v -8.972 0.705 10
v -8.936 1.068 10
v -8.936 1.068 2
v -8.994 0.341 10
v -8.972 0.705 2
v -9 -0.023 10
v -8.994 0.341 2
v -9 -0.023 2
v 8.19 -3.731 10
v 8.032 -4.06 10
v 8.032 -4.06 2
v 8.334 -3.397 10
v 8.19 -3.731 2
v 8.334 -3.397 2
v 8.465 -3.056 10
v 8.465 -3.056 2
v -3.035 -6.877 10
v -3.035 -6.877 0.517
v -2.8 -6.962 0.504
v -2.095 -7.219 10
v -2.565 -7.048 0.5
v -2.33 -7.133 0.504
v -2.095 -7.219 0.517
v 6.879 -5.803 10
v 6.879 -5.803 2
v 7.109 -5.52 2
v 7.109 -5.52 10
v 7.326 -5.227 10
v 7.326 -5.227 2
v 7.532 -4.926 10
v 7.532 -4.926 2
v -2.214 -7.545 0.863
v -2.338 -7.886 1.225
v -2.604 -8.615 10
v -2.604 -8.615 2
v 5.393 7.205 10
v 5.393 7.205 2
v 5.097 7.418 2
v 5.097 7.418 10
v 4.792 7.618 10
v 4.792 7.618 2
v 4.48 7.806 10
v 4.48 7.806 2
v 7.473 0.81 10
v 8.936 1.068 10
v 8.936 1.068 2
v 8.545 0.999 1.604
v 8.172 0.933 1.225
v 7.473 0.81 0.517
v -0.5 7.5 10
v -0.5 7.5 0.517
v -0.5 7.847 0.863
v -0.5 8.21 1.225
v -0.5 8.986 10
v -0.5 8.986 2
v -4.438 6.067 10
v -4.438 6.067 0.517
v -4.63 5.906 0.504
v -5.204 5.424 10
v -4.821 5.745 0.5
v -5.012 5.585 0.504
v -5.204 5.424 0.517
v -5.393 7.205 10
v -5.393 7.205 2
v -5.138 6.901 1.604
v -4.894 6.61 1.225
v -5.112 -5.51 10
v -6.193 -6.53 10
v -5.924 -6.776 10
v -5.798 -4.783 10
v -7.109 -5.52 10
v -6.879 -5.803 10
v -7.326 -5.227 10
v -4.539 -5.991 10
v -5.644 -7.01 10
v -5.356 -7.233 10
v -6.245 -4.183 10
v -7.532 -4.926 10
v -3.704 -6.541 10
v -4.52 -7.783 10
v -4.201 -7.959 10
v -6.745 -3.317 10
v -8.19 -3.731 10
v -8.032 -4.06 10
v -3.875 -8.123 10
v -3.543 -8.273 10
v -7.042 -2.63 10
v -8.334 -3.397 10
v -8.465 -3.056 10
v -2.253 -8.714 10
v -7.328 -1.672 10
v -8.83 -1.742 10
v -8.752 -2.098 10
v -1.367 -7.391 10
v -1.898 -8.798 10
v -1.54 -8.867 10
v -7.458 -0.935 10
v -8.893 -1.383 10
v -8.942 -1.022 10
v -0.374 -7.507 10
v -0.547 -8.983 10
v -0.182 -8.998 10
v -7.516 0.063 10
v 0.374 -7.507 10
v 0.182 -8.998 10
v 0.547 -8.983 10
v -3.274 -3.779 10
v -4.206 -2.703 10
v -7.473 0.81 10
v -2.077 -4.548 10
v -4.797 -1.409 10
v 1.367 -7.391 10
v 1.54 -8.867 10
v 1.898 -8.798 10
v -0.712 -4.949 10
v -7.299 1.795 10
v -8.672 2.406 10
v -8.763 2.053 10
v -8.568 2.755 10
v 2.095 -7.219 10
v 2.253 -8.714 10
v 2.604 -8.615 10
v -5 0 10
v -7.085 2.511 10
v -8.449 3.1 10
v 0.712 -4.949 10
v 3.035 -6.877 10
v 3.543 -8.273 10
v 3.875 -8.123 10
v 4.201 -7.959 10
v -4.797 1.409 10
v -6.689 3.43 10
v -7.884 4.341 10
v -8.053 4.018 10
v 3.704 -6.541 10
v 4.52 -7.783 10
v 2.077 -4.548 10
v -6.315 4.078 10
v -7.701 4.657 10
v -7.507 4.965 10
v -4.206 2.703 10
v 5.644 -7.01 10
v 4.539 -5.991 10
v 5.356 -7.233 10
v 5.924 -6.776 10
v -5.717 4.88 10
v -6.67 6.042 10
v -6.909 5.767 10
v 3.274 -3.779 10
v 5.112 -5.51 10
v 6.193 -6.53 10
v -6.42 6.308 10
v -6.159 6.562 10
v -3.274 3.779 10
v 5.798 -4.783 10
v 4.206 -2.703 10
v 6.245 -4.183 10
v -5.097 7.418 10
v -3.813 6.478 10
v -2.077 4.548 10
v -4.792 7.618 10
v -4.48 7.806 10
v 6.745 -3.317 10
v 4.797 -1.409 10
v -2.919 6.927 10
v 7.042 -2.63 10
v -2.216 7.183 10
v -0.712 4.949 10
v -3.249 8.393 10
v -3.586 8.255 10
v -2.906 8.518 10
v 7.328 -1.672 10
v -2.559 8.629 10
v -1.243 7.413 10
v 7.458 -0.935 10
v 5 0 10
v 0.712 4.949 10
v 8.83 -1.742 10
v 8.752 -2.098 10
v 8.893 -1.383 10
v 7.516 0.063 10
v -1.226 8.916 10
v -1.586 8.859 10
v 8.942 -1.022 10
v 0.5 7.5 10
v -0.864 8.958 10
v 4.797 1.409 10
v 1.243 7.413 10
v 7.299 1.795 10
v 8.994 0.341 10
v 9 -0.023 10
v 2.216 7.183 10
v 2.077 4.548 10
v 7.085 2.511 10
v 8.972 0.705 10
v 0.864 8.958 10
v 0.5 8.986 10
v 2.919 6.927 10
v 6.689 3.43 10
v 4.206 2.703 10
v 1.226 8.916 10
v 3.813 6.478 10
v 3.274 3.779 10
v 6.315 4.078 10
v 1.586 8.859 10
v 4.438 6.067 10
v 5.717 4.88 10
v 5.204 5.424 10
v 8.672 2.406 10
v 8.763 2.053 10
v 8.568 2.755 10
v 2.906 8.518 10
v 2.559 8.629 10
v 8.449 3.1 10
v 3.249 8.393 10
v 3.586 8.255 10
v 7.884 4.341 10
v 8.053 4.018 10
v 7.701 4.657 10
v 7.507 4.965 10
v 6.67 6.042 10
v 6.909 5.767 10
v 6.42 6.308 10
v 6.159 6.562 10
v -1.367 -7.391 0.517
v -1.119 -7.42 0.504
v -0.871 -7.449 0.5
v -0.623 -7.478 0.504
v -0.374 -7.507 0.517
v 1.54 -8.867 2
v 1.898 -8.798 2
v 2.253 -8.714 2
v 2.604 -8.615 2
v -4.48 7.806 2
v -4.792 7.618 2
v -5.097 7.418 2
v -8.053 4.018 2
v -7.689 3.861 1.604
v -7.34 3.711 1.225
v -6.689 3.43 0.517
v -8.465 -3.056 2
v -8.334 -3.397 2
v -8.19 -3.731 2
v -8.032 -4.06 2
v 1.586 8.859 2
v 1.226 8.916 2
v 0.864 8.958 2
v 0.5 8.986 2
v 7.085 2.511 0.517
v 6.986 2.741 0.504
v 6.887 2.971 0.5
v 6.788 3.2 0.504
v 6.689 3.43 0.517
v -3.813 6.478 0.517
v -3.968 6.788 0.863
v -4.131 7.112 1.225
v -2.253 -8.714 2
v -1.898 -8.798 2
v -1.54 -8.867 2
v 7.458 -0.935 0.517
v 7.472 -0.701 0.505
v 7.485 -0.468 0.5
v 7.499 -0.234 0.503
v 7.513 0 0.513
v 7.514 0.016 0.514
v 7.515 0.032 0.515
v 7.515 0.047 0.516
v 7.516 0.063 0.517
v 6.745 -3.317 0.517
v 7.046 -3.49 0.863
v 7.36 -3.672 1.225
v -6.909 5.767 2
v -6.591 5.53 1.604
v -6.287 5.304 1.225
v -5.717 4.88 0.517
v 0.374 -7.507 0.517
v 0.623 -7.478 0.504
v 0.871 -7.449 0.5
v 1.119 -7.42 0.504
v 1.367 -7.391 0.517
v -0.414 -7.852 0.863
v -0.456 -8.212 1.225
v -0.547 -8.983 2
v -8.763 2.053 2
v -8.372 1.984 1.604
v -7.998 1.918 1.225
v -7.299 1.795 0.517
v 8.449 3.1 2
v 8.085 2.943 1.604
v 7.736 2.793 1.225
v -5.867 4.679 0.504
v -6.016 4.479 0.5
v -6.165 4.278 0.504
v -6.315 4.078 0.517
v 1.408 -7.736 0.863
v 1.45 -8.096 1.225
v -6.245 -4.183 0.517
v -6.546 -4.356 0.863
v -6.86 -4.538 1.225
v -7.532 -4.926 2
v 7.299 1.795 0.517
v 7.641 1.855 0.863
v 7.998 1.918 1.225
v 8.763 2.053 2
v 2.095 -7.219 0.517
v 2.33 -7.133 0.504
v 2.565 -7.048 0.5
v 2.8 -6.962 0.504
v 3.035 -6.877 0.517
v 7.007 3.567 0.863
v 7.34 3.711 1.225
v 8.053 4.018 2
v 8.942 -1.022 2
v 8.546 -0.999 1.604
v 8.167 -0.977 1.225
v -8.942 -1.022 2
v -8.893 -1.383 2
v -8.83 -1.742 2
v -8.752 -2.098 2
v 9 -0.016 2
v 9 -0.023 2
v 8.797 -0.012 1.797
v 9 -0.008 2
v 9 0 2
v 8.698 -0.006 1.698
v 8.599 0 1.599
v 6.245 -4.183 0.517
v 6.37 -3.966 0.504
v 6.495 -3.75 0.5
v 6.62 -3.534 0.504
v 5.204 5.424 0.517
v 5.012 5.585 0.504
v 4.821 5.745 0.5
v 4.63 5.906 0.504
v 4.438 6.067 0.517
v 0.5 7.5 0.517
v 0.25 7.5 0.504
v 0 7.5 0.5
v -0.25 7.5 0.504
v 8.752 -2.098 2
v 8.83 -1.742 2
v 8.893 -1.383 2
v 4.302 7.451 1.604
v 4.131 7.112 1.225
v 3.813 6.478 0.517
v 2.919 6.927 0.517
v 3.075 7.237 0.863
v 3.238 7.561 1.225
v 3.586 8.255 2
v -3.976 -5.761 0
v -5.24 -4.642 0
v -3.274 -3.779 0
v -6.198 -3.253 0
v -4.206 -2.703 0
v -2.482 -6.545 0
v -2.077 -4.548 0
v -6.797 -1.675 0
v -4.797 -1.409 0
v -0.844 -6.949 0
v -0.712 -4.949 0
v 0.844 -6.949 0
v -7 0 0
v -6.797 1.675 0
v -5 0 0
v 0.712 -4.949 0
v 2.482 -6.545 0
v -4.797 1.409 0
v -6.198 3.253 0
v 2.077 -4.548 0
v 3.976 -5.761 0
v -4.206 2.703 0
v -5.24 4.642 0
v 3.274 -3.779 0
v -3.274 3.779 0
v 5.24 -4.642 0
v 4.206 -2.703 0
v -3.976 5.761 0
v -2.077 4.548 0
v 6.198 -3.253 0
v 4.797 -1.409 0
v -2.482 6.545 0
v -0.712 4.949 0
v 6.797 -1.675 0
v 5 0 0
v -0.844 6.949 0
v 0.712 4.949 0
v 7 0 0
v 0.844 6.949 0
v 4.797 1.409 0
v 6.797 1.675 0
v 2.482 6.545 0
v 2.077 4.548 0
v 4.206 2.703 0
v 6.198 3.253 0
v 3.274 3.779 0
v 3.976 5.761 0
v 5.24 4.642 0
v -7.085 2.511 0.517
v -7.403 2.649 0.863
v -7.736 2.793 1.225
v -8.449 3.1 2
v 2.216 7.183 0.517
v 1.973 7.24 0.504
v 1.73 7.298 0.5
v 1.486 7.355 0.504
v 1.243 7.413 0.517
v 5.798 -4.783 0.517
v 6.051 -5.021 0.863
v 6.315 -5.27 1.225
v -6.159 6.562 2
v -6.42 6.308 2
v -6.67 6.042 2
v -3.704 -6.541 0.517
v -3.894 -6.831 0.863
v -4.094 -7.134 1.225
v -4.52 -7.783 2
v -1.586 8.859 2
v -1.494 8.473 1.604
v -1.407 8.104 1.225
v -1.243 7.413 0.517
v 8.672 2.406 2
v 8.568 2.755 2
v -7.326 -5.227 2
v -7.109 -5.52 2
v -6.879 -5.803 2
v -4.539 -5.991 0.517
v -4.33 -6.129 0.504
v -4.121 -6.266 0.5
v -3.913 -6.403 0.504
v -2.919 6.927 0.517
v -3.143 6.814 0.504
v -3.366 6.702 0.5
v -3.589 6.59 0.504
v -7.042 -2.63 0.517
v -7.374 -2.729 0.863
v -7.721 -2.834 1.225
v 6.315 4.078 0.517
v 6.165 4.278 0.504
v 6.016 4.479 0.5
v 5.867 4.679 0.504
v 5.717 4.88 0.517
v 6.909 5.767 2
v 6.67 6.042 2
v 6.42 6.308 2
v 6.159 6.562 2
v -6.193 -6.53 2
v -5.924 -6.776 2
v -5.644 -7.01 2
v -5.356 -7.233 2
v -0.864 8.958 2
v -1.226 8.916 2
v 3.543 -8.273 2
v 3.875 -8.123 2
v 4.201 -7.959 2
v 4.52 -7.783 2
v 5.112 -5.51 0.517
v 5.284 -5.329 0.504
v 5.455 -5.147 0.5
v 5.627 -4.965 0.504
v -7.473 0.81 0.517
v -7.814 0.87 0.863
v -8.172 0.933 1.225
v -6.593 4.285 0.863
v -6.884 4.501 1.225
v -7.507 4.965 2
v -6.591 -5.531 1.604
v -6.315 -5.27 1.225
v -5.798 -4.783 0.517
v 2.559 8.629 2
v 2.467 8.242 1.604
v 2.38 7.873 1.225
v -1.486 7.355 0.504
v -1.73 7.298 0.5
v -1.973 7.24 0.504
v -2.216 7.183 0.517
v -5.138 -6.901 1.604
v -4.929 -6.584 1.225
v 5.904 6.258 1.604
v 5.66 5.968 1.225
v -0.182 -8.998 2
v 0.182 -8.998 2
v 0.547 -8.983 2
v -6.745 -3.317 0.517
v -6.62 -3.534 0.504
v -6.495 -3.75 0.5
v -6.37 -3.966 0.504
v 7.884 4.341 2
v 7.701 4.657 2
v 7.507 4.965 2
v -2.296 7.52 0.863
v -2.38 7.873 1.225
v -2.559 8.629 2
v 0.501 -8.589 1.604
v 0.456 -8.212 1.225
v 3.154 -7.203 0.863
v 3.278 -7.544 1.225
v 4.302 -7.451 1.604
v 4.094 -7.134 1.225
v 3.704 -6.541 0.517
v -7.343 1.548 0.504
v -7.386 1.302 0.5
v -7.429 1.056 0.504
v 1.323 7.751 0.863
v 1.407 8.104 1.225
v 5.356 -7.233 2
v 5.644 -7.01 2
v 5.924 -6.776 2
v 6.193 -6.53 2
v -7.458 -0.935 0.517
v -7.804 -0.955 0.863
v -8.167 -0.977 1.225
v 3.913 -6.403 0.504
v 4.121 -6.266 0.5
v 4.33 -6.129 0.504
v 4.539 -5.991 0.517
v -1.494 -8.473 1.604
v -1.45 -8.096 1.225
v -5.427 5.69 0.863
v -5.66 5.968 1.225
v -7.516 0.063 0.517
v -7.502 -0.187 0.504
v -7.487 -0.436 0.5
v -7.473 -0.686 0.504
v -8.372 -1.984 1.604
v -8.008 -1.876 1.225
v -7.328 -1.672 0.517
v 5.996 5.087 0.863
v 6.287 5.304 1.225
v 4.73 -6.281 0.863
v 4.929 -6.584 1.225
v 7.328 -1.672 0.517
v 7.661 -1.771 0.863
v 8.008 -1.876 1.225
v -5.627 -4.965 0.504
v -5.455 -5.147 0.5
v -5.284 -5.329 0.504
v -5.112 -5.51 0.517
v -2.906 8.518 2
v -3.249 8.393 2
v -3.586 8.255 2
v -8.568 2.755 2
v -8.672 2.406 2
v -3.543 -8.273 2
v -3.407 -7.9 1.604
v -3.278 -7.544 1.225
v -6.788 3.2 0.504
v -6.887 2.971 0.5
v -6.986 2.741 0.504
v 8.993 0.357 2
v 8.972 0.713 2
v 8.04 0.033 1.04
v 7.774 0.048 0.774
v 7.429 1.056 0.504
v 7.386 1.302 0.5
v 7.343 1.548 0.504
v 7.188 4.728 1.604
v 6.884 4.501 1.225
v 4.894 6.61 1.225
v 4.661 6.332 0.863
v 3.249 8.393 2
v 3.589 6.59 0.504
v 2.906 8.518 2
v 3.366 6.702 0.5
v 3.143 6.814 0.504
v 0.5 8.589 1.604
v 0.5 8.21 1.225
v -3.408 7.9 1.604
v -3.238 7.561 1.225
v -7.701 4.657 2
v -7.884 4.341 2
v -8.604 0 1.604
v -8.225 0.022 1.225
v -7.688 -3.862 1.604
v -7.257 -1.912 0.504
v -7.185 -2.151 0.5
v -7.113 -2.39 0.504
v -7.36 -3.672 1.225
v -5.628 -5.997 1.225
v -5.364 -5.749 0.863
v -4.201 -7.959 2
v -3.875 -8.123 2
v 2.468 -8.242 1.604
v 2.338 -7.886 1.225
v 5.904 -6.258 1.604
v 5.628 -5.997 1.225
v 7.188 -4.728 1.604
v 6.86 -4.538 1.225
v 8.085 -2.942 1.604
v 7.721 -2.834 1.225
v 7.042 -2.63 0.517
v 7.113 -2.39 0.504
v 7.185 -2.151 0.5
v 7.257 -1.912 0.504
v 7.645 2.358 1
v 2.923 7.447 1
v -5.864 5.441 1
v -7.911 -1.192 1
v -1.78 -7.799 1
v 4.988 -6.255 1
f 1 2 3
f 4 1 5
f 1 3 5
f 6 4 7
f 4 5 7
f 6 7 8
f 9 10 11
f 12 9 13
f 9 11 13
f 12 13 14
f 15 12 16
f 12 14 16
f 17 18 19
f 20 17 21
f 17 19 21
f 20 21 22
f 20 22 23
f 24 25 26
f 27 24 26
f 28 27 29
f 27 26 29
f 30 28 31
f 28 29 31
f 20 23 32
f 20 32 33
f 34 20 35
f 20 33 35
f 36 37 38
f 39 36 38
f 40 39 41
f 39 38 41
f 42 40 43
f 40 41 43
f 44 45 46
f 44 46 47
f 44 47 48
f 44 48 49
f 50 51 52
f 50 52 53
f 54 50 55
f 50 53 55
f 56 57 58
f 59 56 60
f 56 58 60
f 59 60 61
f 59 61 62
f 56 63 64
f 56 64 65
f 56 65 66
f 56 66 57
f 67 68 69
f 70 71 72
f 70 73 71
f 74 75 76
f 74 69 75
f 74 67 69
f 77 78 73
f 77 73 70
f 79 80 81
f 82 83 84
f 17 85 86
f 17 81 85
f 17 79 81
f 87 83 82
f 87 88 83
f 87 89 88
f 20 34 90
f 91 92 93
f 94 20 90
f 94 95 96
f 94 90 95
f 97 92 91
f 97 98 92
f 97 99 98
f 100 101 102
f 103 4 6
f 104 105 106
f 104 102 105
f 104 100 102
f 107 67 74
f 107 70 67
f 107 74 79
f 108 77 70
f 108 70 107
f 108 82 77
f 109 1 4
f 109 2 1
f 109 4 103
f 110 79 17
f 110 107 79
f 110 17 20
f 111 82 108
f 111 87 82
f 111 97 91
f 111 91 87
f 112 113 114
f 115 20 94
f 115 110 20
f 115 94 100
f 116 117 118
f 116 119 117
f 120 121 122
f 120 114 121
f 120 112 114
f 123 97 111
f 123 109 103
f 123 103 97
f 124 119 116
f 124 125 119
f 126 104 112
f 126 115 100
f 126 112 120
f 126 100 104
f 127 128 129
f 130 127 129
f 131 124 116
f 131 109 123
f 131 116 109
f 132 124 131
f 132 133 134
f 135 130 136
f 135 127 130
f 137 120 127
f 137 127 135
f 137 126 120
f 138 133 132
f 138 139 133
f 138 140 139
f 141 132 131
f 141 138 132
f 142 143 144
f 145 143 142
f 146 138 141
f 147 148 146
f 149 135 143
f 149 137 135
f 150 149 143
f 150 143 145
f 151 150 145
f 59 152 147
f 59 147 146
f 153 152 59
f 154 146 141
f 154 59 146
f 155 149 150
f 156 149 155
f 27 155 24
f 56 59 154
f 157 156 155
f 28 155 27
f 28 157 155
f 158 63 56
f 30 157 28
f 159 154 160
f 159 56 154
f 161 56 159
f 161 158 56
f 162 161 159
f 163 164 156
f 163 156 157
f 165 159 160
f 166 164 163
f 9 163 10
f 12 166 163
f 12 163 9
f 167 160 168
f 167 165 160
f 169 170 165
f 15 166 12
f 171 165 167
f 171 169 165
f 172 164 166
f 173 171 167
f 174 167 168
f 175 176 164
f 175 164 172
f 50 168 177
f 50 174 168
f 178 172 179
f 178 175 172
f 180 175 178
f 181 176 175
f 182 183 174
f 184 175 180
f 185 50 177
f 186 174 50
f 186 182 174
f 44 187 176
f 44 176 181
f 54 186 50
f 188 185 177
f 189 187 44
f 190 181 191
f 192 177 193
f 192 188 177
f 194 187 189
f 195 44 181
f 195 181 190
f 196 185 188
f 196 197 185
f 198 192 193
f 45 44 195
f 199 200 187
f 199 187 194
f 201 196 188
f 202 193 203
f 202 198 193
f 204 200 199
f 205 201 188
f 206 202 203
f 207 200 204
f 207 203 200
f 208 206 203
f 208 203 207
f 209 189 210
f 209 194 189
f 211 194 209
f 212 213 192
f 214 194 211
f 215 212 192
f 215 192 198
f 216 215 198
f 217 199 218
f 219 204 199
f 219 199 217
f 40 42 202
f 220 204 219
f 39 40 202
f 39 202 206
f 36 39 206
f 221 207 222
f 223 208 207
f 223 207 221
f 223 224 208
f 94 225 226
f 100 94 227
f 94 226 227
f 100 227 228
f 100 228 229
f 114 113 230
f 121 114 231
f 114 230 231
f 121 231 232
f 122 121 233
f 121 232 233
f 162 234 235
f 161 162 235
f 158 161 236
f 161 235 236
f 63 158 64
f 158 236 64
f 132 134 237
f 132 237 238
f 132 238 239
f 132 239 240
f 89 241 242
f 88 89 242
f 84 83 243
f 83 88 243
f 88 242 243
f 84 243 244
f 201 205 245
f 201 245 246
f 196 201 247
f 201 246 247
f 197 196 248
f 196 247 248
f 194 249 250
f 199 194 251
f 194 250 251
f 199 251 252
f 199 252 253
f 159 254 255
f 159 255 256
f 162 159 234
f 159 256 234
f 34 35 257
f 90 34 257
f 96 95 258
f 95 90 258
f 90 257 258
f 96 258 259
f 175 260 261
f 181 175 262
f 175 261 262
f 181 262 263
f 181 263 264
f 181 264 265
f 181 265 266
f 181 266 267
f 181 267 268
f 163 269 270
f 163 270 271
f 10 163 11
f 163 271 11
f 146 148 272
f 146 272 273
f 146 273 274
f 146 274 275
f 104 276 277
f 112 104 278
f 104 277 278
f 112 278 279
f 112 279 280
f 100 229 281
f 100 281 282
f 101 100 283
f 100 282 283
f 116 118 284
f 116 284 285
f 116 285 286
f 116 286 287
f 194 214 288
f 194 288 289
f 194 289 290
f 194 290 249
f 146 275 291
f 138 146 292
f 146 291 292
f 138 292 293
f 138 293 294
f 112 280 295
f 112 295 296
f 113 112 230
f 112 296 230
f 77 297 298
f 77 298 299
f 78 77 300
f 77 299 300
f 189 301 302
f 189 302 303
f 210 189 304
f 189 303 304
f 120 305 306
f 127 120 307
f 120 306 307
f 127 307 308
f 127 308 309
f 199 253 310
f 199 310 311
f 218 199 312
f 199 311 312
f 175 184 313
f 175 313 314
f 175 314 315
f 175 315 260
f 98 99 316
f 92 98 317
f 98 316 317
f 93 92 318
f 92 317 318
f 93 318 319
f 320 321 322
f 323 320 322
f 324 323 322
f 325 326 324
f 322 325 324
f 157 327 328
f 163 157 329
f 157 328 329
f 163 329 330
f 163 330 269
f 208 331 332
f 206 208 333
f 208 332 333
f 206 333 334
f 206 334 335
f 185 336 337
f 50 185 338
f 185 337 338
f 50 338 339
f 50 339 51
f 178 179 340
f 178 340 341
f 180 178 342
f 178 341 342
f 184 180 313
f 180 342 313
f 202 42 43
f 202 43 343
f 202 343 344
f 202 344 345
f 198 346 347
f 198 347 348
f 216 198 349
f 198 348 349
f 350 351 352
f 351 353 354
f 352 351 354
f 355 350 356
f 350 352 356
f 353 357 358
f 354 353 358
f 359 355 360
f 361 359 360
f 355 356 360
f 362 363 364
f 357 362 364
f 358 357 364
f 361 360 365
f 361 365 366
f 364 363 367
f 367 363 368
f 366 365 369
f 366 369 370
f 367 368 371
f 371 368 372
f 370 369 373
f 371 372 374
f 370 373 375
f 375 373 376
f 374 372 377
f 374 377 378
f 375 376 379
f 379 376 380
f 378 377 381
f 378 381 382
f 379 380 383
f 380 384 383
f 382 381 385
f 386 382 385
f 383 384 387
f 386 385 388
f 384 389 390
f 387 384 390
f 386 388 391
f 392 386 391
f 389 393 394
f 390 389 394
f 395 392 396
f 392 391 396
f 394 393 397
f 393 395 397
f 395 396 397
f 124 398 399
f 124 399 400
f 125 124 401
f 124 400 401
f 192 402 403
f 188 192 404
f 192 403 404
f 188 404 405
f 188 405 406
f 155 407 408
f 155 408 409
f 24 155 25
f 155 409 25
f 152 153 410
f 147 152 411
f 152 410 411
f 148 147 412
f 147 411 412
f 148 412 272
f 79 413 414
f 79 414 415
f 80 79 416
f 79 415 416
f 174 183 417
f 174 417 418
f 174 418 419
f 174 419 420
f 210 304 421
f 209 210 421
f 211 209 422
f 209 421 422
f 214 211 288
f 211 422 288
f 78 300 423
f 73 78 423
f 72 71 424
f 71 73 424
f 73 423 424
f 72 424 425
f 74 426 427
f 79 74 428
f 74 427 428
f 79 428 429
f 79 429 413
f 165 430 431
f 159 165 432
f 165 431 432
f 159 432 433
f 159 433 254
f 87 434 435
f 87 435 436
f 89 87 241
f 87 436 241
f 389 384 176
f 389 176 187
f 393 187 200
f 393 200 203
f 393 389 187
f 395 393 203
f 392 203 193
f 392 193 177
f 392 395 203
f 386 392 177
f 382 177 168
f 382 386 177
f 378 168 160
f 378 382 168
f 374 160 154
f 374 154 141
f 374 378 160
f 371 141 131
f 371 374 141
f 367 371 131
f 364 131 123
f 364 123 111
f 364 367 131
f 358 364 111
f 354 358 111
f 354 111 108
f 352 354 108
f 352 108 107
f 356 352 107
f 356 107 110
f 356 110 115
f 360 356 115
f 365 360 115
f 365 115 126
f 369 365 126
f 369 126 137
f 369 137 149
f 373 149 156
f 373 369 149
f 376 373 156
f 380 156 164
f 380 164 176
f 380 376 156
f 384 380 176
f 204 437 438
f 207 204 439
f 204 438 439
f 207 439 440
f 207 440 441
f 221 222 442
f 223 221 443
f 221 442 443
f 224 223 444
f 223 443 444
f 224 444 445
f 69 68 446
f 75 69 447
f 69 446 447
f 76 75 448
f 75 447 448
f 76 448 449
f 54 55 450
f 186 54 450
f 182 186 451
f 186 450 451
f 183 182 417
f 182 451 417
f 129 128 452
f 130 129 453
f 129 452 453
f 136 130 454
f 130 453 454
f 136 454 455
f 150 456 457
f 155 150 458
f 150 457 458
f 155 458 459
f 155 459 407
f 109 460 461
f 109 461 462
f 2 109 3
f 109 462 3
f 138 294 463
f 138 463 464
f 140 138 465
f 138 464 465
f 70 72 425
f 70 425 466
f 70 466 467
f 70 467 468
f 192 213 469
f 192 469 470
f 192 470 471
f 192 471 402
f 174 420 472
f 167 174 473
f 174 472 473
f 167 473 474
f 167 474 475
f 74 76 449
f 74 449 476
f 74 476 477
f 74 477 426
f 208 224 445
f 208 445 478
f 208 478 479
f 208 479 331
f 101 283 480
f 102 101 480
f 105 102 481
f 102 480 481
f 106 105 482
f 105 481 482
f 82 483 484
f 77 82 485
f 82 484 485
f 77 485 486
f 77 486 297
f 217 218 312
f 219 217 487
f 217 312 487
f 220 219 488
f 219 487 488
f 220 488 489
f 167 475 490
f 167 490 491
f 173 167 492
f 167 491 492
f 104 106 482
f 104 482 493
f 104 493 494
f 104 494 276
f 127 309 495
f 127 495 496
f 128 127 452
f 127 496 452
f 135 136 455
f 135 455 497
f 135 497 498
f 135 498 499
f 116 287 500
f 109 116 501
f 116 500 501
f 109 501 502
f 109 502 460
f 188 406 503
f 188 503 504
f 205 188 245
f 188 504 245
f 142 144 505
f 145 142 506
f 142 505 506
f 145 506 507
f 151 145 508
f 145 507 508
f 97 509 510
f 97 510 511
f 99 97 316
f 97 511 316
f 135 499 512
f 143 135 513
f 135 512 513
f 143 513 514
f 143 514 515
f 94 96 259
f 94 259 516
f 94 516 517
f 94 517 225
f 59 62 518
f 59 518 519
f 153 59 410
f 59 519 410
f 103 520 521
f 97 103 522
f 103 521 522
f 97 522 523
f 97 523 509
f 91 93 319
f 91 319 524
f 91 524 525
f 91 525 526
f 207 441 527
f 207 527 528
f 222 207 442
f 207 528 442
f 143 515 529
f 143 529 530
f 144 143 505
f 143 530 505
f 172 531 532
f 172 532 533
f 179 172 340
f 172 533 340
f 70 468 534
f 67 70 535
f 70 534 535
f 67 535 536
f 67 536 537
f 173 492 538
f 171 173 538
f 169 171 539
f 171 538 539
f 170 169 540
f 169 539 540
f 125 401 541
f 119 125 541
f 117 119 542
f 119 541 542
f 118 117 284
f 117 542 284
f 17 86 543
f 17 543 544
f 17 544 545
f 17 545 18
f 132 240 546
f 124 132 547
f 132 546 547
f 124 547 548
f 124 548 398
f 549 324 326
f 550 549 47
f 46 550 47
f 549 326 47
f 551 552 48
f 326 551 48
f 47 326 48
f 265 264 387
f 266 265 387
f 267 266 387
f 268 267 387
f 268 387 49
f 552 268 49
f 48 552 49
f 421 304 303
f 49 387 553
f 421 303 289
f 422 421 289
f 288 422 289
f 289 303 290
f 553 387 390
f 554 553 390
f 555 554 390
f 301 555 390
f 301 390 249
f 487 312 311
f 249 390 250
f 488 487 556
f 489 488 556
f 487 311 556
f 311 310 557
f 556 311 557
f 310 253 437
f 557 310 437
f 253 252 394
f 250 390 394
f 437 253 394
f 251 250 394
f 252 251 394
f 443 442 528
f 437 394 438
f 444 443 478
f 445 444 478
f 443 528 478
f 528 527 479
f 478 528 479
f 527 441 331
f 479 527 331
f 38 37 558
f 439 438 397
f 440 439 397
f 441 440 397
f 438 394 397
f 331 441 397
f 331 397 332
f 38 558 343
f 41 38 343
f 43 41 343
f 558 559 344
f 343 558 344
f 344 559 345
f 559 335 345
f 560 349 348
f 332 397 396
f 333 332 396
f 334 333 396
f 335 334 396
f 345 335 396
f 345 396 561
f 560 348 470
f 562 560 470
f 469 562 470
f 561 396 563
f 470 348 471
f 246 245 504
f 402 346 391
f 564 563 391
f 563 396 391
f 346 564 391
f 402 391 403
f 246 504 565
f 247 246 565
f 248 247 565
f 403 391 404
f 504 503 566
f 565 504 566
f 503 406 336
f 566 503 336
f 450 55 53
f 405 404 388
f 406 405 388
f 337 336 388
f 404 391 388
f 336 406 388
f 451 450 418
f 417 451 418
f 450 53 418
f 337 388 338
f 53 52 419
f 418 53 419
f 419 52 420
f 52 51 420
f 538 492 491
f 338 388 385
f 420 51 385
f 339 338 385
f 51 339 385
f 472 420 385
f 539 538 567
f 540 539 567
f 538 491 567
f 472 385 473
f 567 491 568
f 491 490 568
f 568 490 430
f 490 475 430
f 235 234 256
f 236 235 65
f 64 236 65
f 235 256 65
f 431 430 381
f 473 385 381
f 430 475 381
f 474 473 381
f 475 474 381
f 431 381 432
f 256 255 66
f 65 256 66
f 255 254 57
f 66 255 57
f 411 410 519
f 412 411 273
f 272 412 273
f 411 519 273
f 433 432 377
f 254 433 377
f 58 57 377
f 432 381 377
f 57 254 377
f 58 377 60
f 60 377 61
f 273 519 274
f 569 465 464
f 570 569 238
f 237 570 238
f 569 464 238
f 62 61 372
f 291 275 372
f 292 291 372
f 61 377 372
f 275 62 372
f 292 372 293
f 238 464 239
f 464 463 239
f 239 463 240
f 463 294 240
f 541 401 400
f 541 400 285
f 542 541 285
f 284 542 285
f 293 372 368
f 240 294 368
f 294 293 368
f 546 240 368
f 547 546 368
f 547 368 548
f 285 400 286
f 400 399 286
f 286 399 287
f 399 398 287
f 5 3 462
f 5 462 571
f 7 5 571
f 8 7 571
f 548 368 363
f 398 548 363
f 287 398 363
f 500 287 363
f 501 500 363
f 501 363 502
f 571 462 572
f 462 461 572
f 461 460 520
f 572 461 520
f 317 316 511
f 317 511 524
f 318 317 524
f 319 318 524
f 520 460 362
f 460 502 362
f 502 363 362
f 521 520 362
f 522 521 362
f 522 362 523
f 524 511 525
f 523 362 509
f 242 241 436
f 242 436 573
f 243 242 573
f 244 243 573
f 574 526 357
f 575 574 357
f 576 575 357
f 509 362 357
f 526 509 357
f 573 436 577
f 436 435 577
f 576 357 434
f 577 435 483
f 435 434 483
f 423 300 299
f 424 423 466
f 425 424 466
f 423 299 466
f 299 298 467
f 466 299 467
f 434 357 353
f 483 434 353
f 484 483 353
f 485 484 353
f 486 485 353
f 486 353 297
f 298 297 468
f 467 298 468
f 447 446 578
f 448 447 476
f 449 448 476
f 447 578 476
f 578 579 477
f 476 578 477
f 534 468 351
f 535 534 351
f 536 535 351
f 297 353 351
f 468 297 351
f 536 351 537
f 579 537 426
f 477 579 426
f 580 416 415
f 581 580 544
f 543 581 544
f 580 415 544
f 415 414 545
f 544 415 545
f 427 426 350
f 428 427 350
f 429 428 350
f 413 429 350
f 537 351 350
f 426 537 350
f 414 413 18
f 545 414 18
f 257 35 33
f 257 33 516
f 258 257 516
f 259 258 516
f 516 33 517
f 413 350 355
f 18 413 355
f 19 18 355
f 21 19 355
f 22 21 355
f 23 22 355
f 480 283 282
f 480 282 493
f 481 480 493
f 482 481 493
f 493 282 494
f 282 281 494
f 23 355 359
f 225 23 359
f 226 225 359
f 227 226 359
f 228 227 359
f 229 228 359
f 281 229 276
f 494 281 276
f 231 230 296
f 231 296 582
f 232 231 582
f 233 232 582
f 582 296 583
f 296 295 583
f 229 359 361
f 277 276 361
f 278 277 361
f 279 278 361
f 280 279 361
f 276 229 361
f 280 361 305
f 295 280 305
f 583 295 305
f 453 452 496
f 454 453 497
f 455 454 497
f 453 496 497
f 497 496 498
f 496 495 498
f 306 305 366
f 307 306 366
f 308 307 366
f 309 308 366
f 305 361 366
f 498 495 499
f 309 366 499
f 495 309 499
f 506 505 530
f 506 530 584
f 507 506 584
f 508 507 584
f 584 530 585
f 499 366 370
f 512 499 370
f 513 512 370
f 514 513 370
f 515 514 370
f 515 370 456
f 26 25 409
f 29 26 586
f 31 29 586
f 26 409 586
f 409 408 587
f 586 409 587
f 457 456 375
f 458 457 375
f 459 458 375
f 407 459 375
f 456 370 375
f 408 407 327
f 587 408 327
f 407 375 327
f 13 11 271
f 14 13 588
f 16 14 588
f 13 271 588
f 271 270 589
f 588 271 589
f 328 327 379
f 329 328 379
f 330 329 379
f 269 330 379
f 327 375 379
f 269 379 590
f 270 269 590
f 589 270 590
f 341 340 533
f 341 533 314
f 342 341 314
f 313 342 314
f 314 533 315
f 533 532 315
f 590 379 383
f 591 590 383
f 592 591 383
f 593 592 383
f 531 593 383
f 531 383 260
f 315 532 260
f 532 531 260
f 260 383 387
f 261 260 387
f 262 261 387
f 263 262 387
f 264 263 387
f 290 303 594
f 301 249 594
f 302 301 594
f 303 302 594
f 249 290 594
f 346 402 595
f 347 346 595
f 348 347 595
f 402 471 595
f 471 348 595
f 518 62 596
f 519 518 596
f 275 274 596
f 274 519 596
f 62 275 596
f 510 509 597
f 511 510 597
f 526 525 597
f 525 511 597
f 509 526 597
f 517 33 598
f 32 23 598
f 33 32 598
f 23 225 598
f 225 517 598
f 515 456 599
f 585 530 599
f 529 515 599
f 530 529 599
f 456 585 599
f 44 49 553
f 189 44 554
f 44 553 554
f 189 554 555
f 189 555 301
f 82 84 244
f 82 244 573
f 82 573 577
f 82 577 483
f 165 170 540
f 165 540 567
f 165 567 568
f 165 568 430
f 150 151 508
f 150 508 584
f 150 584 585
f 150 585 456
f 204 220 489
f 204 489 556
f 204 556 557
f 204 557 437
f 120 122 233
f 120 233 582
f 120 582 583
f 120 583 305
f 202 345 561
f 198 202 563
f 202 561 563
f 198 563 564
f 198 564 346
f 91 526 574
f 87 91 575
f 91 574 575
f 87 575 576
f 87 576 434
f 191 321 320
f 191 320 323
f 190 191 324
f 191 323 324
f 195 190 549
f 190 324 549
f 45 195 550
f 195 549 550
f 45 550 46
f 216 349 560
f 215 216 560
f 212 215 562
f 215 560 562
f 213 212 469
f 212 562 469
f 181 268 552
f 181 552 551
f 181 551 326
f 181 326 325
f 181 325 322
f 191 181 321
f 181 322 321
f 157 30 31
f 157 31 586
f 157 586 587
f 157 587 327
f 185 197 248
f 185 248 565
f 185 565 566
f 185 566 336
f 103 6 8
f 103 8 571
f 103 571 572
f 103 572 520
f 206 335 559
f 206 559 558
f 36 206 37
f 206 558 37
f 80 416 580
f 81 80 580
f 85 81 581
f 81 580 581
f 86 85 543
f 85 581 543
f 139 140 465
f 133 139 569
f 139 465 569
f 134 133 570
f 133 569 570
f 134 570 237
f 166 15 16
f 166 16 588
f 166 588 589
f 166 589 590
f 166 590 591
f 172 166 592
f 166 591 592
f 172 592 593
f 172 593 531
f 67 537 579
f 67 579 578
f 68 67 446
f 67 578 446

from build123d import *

# Parameters (mm, degrees)
SKETCH1_R           = 9
SKETCH1_R_2         = 5
BOSS_EXTRUDE1_DEPTH = 10
CHAMFER1_SIZE       = 2
CUT_EXTRUDE1_DEPTH  = 17.186414056
CIRPATTERN1_COUNT   = 27


with BuildPart() as part:
    # Sketch1 → Boss-Extrude1 (new body)
    with BuildSketch(Plane.XY):
        Circle(SKETCH1_R)
        Circle(SKETCH1_R_2, mode=Mode.SUBTRACT)
    extrude(amount=BOSS_EXTRUDE1_DEPTH)

    # Chamfer1
    chamfer1_edges = [part.edges().sort_by_distance(p)[0] for p in [
        (-9, 0, 0),
    ]]
    chamfer(chamfer1_edges, length=CHAMFER1_SIZE)

    # Sketch2 → Cut-Extrude1 (cut, through all)
    with BuildSketch(Plane(origin=(0, 0, 0), x_dir=(-1, 0, 0), z_dir=(0, 0, -1))):
        with BuildLine():
            Line((-0.5, 7.5), (0.5, 7.5))
            Line((0.5, 7.5), (0.5, 8.986100378))
            ThreePointArc((0.5, 8.986100378), (0, 9), (-0.5, 8.986100378))
            Line((-0.5, 8.986100378), (-0.5, 7.5))
        make_face()
    cut_extrude1 = extrude(amount=-CUT_EXTRUDE1_DEPTH, mode=Mode.SUBTRACT)

    # CirPattern1: Cut-Extrude1 ×27 about axis
    cirpattern1_axis = Axis((0, 0, 10), (0, 0, -1))
    for i in range(1, CIRPATTERN1_COUNT):
        add(cut_extrude1.rotate(cirpattern1_axis, i * 360 / CIRPATTERN1_COUNT), mode=Mode.SUBTRACT)


solid = part.part
